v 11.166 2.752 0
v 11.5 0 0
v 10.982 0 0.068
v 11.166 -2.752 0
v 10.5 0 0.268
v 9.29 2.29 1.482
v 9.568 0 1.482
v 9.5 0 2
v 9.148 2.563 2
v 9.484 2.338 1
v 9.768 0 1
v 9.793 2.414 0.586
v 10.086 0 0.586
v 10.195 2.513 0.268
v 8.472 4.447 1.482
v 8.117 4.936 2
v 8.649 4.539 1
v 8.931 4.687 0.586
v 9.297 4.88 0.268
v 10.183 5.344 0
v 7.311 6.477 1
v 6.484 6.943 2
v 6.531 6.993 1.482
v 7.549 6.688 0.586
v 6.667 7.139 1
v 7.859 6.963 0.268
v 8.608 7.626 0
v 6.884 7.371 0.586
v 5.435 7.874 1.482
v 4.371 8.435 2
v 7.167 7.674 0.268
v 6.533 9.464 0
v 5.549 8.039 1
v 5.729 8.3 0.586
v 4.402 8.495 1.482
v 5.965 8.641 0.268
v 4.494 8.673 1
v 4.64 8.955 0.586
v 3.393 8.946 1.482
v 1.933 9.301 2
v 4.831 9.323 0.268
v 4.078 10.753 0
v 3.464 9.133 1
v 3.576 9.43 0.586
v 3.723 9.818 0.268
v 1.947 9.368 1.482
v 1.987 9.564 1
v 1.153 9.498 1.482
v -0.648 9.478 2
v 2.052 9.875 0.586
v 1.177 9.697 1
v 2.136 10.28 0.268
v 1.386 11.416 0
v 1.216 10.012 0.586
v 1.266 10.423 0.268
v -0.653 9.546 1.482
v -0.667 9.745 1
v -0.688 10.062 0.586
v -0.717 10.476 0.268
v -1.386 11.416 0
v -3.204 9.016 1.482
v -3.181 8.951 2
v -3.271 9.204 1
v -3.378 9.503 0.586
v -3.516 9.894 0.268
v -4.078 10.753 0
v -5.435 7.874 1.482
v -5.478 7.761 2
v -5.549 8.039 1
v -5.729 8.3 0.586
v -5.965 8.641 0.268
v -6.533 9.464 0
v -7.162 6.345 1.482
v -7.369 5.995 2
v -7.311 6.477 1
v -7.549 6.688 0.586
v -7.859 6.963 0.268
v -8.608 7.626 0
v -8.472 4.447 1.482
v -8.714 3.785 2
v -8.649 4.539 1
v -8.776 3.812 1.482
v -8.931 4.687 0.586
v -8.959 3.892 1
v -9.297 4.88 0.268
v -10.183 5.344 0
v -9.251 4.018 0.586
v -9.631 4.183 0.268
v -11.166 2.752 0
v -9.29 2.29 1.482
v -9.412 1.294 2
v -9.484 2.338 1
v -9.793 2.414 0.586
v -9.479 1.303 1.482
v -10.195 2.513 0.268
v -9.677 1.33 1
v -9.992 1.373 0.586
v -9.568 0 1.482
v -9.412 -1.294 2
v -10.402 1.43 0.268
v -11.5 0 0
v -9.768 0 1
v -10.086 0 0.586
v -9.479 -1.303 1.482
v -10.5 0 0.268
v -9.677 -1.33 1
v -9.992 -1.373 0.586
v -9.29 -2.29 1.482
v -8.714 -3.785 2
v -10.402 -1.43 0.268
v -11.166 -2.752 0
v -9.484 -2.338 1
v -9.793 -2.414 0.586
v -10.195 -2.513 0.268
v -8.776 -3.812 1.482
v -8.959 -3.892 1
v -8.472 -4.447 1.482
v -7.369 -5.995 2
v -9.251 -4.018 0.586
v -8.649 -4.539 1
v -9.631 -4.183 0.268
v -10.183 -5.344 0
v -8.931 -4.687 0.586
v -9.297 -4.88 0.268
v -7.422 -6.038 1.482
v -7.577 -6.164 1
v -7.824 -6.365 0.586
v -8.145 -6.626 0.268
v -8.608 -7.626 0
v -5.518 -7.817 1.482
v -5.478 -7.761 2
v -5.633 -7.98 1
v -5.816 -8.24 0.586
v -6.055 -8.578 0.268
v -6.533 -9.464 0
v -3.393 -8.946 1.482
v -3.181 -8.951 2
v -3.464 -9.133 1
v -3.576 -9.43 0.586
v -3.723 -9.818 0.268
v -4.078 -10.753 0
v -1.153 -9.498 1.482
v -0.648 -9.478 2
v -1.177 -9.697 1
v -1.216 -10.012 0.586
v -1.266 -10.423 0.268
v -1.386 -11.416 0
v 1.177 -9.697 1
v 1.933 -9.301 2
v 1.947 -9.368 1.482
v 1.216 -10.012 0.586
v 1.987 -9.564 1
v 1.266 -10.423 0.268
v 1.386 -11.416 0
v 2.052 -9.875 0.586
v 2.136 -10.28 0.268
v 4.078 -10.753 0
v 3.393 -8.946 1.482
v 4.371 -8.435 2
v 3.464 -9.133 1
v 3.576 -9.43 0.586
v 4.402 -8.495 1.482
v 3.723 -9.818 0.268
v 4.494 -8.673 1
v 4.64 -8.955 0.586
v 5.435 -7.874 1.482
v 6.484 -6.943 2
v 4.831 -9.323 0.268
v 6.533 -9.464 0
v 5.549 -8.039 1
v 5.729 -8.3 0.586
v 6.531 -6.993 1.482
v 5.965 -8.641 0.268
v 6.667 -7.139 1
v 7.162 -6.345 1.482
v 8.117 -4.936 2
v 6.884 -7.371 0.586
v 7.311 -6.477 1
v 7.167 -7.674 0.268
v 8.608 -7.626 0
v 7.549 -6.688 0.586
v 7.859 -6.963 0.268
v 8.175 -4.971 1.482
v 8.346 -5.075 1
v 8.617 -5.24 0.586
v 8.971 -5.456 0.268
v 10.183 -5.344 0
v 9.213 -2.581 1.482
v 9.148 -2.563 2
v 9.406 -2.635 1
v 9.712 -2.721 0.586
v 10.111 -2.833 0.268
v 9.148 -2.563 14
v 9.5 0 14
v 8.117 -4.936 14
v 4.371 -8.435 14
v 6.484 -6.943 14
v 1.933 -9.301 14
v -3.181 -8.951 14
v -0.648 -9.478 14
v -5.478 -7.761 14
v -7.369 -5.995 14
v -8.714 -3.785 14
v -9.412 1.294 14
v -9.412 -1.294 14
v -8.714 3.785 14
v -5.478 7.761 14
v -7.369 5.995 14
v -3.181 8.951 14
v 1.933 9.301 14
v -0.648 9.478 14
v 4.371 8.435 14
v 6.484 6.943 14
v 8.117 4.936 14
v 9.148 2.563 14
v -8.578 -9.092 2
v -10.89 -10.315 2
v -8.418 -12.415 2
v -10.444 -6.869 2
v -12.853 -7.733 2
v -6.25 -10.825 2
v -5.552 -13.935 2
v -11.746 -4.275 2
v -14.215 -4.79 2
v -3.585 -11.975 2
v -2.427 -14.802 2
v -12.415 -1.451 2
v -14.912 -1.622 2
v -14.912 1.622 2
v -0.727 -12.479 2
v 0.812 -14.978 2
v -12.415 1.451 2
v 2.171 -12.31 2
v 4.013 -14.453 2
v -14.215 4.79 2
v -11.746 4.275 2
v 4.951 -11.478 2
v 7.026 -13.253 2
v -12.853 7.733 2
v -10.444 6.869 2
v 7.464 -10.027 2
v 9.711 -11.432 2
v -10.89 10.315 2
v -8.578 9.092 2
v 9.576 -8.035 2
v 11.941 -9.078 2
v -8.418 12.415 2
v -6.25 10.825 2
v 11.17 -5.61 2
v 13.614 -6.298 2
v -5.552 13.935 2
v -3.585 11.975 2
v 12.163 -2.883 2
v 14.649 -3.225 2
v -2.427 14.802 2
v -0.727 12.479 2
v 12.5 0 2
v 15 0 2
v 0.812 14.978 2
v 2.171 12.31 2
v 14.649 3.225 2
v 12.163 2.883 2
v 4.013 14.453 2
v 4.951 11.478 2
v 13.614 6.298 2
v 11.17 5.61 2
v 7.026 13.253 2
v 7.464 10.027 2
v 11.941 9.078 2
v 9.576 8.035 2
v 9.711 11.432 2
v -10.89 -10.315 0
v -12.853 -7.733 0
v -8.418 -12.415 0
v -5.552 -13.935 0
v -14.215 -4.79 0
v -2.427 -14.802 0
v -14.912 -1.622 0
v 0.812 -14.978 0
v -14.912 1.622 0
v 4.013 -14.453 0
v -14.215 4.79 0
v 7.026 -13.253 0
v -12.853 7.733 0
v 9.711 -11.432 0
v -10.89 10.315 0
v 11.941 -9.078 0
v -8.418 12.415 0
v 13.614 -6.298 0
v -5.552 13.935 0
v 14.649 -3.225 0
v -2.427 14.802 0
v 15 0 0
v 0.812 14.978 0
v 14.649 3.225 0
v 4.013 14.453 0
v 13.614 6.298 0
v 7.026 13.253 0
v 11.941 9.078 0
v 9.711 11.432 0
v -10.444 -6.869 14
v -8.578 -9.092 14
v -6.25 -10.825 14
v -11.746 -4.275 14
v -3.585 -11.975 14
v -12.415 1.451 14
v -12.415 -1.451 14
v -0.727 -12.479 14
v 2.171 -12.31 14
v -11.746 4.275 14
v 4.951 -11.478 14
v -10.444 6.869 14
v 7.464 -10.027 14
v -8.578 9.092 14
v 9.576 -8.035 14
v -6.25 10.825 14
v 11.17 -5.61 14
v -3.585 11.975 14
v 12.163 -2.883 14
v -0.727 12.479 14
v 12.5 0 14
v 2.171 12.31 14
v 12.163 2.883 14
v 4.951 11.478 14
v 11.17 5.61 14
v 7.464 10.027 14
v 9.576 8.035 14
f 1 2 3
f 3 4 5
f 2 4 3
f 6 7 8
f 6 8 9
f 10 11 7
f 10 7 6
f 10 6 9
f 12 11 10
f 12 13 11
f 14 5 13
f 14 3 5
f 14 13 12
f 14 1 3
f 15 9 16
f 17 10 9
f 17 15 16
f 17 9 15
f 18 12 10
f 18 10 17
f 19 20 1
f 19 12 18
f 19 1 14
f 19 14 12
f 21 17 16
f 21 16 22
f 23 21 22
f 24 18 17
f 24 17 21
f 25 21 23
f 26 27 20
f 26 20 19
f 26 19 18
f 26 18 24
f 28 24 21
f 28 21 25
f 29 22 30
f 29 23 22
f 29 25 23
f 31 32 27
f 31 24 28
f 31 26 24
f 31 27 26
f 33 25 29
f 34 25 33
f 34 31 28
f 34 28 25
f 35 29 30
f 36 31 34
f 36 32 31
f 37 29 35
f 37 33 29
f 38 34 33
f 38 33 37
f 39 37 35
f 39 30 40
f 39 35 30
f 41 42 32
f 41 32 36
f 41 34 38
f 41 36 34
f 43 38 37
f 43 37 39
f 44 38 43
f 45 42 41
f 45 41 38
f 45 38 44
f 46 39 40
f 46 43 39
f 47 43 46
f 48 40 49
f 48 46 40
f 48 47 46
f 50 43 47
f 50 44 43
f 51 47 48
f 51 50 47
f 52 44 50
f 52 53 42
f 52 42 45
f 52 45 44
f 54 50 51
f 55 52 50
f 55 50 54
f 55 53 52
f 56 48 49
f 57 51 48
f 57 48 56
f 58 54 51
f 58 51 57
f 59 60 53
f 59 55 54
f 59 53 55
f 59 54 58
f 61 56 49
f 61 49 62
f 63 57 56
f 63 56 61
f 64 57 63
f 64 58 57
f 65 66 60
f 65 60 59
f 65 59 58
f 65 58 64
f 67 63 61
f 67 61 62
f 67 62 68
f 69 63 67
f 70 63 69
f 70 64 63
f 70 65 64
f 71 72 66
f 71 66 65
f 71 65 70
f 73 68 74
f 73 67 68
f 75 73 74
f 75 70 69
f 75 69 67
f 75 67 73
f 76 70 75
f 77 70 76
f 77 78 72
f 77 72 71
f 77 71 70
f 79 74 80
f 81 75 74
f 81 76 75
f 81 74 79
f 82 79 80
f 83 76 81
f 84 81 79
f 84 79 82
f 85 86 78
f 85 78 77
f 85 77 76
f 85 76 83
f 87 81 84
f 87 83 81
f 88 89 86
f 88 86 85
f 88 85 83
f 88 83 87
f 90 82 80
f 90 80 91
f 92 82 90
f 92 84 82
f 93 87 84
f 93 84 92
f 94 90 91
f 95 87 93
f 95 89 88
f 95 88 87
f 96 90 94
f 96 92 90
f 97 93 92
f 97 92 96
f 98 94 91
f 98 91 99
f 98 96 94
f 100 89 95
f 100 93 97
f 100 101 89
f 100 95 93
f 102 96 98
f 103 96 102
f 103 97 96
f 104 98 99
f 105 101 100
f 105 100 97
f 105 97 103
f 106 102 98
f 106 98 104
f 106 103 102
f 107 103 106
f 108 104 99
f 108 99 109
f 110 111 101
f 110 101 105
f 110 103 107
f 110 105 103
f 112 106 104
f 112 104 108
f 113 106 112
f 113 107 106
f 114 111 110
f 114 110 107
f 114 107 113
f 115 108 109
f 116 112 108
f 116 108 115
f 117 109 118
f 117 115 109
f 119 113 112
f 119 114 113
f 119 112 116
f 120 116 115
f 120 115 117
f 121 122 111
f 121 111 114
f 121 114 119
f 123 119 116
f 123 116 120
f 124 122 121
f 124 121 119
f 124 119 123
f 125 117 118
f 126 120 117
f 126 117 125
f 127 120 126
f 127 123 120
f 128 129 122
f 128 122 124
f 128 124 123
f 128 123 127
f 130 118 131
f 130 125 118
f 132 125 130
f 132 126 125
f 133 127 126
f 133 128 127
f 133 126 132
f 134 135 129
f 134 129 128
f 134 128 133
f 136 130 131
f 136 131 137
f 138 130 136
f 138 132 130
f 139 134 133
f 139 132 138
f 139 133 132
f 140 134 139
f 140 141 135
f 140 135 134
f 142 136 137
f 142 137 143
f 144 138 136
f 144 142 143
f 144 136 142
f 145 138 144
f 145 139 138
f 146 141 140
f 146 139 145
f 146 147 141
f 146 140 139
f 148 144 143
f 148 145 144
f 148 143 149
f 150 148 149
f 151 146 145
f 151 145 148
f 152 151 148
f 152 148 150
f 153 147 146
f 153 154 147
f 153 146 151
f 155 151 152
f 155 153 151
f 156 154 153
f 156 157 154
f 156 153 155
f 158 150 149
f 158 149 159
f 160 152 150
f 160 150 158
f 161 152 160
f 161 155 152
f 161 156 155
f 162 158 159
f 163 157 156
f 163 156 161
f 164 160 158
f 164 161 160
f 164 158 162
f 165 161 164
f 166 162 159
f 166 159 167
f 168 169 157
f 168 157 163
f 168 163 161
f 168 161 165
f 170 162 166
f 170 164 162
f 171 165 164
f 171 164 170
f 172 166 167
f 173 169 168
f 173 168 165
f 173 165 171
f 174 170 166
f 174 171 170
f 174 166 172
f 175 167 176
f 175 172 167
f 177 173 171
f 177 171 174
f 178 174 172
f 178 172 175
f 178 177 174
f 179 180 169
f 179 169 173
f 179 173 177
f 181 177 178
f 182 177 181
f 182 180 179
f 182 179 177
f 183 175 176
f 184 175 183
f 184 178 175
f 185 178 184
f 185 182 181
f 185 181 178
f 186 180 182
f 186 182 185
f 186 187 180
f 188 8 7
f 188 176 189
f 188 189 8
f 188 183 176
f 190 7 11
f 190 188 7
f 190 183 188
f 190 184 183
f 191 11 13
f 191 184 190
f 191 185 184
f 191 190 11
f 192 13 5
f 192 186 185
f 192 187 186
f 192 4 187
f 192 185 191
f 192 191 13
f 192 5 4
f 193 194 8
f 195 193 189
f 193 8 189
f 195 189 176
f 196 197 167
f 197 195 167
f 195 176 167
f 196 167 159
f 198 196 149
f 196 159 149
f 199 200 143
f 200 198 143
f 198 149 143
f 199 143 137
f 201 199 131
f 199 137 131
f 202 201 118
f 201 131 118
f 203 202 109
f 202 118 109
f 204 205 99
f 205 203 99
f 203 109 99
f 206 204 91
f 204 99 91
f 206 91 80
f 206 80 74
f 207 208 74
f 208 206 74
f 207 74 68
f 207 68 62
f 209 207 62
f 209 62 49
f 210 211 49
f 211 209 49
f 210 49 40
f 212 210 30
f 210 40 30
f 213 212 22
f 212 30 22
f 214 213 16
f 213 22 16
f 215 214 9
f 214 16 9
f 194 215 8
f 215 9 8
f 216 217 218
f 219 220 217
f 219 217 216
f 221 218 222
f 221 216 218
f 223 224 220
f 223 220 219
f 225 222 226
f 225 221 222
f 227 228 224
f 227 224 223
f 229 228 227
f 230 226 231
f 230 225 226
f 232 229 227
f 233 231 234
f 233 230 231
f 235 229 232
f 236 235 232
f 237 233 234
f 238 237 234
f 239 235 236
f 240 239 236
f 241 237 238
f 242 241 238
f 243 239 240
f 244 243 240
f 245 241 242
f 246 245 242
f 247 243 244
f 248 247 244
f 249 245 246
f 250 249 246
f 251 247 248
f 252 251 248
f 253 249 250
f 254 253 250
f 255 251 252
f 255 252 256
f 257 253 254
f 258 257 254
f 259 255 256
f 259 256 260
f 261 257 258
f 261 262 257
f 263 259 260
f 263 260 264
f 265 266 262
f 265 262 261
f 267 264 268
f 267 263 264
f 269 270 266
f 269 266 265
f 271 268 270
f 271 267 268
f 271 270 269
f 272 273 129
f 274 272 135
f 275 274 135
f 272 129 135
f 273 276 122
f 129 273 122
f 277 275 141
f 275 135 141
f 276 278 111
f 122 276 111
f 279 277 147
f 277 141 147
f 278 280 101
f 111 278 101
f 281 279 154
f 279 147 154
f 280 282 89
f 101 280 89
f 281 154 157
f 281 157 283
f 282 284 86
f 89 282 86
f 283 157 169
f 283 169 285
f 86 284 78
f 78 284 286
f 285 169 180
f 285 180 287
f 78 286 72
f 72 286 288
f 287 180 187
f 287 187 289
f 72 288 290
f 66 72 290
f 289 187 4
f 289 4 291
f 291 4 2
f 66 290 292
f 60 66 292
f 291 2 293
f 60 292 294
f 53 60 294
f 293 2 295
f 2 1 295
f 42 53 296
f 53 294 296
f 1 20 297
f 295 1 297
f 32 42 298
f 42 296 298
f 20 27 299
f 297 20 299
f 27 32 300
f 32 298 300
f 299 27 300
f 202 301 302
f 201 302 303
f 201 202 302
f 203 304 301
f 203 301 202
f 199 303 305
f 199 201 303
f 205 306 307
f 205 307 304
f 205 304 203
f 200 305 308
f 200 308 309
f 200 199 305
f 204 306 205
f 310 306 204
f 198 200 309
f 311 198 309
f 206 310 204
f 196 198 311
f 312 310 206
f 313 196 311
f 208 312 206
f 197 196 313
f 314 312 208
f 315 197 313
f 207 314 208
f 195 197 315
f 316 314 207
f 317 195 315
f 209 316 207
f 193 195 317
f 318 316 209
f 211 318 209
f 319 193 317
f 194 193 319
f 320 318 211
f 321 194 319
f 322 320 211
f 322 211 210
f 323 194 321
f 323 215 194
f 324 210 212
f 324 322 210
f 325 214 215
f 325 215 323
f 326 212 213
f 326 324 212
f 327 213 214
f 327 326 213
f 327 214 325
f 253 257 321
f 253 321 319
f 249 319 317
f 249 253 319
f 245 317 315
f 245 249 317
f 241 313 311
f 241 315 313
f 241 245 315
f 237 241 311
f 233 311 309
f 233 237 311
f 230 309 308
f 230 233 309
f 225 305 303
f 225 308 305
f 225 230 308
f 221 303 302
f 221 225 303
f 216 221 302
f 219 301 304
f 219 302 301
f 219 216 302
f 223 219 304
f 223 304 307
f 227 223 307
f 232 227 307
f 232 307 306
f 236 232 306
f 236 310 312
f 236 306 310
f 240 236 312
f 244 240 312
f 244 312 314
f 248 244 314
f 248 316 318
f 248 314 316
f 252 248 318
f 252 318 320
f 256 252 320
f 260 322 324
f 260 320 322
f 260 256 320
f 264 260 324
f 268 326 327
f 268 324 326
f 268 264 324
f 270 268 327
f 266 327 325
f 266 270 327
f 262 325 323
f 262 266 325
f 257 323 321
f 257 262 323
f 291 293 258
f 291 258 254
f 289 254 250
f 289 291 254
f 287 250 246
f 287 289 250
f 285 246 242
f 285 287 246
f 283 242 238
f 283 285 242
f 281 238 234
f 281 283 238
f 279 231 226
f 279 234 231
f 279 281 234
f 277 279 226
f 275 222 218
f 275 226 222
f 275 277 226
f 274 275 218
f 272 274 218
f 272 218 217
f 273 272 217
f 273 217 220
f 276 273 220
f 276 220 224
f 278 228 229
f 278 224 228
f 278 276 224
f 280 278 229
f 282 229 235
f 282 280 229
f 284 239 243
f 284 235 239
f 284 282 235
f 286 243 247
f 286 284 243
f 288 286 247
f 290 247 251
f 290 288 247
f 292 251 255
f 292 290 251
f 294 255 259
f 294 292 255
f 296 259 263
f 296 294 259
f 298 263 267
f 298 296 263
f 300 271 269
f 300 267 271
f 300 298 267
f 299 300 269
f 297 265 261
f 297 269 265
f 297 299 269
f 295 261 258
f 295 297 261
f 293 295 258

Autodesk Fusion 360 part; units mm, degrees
sketch "Sketch1" plane through (0, 0, 0) normal (0, 0, 1) x (1, 0, 0)
  circle A0 centre (0, 0) radius 9.5
  circle A1 centre (0, 0) radius 12.5
  circle A2 centre (0, 0) radius 15
  dimension "d1" = 19
  dimension "d2" = 25
  dimension "d3" = 30
extrude "Extrude1" add sketch "Sketch1" along normal blind 2 contours A1 | A2
extrude "Extrude2" add sketch "Sketch1" along normal blind 14 contours A1
fillet "Fillet1" radius 2 1 edges at (-8.8571, 3.4353, 0)
